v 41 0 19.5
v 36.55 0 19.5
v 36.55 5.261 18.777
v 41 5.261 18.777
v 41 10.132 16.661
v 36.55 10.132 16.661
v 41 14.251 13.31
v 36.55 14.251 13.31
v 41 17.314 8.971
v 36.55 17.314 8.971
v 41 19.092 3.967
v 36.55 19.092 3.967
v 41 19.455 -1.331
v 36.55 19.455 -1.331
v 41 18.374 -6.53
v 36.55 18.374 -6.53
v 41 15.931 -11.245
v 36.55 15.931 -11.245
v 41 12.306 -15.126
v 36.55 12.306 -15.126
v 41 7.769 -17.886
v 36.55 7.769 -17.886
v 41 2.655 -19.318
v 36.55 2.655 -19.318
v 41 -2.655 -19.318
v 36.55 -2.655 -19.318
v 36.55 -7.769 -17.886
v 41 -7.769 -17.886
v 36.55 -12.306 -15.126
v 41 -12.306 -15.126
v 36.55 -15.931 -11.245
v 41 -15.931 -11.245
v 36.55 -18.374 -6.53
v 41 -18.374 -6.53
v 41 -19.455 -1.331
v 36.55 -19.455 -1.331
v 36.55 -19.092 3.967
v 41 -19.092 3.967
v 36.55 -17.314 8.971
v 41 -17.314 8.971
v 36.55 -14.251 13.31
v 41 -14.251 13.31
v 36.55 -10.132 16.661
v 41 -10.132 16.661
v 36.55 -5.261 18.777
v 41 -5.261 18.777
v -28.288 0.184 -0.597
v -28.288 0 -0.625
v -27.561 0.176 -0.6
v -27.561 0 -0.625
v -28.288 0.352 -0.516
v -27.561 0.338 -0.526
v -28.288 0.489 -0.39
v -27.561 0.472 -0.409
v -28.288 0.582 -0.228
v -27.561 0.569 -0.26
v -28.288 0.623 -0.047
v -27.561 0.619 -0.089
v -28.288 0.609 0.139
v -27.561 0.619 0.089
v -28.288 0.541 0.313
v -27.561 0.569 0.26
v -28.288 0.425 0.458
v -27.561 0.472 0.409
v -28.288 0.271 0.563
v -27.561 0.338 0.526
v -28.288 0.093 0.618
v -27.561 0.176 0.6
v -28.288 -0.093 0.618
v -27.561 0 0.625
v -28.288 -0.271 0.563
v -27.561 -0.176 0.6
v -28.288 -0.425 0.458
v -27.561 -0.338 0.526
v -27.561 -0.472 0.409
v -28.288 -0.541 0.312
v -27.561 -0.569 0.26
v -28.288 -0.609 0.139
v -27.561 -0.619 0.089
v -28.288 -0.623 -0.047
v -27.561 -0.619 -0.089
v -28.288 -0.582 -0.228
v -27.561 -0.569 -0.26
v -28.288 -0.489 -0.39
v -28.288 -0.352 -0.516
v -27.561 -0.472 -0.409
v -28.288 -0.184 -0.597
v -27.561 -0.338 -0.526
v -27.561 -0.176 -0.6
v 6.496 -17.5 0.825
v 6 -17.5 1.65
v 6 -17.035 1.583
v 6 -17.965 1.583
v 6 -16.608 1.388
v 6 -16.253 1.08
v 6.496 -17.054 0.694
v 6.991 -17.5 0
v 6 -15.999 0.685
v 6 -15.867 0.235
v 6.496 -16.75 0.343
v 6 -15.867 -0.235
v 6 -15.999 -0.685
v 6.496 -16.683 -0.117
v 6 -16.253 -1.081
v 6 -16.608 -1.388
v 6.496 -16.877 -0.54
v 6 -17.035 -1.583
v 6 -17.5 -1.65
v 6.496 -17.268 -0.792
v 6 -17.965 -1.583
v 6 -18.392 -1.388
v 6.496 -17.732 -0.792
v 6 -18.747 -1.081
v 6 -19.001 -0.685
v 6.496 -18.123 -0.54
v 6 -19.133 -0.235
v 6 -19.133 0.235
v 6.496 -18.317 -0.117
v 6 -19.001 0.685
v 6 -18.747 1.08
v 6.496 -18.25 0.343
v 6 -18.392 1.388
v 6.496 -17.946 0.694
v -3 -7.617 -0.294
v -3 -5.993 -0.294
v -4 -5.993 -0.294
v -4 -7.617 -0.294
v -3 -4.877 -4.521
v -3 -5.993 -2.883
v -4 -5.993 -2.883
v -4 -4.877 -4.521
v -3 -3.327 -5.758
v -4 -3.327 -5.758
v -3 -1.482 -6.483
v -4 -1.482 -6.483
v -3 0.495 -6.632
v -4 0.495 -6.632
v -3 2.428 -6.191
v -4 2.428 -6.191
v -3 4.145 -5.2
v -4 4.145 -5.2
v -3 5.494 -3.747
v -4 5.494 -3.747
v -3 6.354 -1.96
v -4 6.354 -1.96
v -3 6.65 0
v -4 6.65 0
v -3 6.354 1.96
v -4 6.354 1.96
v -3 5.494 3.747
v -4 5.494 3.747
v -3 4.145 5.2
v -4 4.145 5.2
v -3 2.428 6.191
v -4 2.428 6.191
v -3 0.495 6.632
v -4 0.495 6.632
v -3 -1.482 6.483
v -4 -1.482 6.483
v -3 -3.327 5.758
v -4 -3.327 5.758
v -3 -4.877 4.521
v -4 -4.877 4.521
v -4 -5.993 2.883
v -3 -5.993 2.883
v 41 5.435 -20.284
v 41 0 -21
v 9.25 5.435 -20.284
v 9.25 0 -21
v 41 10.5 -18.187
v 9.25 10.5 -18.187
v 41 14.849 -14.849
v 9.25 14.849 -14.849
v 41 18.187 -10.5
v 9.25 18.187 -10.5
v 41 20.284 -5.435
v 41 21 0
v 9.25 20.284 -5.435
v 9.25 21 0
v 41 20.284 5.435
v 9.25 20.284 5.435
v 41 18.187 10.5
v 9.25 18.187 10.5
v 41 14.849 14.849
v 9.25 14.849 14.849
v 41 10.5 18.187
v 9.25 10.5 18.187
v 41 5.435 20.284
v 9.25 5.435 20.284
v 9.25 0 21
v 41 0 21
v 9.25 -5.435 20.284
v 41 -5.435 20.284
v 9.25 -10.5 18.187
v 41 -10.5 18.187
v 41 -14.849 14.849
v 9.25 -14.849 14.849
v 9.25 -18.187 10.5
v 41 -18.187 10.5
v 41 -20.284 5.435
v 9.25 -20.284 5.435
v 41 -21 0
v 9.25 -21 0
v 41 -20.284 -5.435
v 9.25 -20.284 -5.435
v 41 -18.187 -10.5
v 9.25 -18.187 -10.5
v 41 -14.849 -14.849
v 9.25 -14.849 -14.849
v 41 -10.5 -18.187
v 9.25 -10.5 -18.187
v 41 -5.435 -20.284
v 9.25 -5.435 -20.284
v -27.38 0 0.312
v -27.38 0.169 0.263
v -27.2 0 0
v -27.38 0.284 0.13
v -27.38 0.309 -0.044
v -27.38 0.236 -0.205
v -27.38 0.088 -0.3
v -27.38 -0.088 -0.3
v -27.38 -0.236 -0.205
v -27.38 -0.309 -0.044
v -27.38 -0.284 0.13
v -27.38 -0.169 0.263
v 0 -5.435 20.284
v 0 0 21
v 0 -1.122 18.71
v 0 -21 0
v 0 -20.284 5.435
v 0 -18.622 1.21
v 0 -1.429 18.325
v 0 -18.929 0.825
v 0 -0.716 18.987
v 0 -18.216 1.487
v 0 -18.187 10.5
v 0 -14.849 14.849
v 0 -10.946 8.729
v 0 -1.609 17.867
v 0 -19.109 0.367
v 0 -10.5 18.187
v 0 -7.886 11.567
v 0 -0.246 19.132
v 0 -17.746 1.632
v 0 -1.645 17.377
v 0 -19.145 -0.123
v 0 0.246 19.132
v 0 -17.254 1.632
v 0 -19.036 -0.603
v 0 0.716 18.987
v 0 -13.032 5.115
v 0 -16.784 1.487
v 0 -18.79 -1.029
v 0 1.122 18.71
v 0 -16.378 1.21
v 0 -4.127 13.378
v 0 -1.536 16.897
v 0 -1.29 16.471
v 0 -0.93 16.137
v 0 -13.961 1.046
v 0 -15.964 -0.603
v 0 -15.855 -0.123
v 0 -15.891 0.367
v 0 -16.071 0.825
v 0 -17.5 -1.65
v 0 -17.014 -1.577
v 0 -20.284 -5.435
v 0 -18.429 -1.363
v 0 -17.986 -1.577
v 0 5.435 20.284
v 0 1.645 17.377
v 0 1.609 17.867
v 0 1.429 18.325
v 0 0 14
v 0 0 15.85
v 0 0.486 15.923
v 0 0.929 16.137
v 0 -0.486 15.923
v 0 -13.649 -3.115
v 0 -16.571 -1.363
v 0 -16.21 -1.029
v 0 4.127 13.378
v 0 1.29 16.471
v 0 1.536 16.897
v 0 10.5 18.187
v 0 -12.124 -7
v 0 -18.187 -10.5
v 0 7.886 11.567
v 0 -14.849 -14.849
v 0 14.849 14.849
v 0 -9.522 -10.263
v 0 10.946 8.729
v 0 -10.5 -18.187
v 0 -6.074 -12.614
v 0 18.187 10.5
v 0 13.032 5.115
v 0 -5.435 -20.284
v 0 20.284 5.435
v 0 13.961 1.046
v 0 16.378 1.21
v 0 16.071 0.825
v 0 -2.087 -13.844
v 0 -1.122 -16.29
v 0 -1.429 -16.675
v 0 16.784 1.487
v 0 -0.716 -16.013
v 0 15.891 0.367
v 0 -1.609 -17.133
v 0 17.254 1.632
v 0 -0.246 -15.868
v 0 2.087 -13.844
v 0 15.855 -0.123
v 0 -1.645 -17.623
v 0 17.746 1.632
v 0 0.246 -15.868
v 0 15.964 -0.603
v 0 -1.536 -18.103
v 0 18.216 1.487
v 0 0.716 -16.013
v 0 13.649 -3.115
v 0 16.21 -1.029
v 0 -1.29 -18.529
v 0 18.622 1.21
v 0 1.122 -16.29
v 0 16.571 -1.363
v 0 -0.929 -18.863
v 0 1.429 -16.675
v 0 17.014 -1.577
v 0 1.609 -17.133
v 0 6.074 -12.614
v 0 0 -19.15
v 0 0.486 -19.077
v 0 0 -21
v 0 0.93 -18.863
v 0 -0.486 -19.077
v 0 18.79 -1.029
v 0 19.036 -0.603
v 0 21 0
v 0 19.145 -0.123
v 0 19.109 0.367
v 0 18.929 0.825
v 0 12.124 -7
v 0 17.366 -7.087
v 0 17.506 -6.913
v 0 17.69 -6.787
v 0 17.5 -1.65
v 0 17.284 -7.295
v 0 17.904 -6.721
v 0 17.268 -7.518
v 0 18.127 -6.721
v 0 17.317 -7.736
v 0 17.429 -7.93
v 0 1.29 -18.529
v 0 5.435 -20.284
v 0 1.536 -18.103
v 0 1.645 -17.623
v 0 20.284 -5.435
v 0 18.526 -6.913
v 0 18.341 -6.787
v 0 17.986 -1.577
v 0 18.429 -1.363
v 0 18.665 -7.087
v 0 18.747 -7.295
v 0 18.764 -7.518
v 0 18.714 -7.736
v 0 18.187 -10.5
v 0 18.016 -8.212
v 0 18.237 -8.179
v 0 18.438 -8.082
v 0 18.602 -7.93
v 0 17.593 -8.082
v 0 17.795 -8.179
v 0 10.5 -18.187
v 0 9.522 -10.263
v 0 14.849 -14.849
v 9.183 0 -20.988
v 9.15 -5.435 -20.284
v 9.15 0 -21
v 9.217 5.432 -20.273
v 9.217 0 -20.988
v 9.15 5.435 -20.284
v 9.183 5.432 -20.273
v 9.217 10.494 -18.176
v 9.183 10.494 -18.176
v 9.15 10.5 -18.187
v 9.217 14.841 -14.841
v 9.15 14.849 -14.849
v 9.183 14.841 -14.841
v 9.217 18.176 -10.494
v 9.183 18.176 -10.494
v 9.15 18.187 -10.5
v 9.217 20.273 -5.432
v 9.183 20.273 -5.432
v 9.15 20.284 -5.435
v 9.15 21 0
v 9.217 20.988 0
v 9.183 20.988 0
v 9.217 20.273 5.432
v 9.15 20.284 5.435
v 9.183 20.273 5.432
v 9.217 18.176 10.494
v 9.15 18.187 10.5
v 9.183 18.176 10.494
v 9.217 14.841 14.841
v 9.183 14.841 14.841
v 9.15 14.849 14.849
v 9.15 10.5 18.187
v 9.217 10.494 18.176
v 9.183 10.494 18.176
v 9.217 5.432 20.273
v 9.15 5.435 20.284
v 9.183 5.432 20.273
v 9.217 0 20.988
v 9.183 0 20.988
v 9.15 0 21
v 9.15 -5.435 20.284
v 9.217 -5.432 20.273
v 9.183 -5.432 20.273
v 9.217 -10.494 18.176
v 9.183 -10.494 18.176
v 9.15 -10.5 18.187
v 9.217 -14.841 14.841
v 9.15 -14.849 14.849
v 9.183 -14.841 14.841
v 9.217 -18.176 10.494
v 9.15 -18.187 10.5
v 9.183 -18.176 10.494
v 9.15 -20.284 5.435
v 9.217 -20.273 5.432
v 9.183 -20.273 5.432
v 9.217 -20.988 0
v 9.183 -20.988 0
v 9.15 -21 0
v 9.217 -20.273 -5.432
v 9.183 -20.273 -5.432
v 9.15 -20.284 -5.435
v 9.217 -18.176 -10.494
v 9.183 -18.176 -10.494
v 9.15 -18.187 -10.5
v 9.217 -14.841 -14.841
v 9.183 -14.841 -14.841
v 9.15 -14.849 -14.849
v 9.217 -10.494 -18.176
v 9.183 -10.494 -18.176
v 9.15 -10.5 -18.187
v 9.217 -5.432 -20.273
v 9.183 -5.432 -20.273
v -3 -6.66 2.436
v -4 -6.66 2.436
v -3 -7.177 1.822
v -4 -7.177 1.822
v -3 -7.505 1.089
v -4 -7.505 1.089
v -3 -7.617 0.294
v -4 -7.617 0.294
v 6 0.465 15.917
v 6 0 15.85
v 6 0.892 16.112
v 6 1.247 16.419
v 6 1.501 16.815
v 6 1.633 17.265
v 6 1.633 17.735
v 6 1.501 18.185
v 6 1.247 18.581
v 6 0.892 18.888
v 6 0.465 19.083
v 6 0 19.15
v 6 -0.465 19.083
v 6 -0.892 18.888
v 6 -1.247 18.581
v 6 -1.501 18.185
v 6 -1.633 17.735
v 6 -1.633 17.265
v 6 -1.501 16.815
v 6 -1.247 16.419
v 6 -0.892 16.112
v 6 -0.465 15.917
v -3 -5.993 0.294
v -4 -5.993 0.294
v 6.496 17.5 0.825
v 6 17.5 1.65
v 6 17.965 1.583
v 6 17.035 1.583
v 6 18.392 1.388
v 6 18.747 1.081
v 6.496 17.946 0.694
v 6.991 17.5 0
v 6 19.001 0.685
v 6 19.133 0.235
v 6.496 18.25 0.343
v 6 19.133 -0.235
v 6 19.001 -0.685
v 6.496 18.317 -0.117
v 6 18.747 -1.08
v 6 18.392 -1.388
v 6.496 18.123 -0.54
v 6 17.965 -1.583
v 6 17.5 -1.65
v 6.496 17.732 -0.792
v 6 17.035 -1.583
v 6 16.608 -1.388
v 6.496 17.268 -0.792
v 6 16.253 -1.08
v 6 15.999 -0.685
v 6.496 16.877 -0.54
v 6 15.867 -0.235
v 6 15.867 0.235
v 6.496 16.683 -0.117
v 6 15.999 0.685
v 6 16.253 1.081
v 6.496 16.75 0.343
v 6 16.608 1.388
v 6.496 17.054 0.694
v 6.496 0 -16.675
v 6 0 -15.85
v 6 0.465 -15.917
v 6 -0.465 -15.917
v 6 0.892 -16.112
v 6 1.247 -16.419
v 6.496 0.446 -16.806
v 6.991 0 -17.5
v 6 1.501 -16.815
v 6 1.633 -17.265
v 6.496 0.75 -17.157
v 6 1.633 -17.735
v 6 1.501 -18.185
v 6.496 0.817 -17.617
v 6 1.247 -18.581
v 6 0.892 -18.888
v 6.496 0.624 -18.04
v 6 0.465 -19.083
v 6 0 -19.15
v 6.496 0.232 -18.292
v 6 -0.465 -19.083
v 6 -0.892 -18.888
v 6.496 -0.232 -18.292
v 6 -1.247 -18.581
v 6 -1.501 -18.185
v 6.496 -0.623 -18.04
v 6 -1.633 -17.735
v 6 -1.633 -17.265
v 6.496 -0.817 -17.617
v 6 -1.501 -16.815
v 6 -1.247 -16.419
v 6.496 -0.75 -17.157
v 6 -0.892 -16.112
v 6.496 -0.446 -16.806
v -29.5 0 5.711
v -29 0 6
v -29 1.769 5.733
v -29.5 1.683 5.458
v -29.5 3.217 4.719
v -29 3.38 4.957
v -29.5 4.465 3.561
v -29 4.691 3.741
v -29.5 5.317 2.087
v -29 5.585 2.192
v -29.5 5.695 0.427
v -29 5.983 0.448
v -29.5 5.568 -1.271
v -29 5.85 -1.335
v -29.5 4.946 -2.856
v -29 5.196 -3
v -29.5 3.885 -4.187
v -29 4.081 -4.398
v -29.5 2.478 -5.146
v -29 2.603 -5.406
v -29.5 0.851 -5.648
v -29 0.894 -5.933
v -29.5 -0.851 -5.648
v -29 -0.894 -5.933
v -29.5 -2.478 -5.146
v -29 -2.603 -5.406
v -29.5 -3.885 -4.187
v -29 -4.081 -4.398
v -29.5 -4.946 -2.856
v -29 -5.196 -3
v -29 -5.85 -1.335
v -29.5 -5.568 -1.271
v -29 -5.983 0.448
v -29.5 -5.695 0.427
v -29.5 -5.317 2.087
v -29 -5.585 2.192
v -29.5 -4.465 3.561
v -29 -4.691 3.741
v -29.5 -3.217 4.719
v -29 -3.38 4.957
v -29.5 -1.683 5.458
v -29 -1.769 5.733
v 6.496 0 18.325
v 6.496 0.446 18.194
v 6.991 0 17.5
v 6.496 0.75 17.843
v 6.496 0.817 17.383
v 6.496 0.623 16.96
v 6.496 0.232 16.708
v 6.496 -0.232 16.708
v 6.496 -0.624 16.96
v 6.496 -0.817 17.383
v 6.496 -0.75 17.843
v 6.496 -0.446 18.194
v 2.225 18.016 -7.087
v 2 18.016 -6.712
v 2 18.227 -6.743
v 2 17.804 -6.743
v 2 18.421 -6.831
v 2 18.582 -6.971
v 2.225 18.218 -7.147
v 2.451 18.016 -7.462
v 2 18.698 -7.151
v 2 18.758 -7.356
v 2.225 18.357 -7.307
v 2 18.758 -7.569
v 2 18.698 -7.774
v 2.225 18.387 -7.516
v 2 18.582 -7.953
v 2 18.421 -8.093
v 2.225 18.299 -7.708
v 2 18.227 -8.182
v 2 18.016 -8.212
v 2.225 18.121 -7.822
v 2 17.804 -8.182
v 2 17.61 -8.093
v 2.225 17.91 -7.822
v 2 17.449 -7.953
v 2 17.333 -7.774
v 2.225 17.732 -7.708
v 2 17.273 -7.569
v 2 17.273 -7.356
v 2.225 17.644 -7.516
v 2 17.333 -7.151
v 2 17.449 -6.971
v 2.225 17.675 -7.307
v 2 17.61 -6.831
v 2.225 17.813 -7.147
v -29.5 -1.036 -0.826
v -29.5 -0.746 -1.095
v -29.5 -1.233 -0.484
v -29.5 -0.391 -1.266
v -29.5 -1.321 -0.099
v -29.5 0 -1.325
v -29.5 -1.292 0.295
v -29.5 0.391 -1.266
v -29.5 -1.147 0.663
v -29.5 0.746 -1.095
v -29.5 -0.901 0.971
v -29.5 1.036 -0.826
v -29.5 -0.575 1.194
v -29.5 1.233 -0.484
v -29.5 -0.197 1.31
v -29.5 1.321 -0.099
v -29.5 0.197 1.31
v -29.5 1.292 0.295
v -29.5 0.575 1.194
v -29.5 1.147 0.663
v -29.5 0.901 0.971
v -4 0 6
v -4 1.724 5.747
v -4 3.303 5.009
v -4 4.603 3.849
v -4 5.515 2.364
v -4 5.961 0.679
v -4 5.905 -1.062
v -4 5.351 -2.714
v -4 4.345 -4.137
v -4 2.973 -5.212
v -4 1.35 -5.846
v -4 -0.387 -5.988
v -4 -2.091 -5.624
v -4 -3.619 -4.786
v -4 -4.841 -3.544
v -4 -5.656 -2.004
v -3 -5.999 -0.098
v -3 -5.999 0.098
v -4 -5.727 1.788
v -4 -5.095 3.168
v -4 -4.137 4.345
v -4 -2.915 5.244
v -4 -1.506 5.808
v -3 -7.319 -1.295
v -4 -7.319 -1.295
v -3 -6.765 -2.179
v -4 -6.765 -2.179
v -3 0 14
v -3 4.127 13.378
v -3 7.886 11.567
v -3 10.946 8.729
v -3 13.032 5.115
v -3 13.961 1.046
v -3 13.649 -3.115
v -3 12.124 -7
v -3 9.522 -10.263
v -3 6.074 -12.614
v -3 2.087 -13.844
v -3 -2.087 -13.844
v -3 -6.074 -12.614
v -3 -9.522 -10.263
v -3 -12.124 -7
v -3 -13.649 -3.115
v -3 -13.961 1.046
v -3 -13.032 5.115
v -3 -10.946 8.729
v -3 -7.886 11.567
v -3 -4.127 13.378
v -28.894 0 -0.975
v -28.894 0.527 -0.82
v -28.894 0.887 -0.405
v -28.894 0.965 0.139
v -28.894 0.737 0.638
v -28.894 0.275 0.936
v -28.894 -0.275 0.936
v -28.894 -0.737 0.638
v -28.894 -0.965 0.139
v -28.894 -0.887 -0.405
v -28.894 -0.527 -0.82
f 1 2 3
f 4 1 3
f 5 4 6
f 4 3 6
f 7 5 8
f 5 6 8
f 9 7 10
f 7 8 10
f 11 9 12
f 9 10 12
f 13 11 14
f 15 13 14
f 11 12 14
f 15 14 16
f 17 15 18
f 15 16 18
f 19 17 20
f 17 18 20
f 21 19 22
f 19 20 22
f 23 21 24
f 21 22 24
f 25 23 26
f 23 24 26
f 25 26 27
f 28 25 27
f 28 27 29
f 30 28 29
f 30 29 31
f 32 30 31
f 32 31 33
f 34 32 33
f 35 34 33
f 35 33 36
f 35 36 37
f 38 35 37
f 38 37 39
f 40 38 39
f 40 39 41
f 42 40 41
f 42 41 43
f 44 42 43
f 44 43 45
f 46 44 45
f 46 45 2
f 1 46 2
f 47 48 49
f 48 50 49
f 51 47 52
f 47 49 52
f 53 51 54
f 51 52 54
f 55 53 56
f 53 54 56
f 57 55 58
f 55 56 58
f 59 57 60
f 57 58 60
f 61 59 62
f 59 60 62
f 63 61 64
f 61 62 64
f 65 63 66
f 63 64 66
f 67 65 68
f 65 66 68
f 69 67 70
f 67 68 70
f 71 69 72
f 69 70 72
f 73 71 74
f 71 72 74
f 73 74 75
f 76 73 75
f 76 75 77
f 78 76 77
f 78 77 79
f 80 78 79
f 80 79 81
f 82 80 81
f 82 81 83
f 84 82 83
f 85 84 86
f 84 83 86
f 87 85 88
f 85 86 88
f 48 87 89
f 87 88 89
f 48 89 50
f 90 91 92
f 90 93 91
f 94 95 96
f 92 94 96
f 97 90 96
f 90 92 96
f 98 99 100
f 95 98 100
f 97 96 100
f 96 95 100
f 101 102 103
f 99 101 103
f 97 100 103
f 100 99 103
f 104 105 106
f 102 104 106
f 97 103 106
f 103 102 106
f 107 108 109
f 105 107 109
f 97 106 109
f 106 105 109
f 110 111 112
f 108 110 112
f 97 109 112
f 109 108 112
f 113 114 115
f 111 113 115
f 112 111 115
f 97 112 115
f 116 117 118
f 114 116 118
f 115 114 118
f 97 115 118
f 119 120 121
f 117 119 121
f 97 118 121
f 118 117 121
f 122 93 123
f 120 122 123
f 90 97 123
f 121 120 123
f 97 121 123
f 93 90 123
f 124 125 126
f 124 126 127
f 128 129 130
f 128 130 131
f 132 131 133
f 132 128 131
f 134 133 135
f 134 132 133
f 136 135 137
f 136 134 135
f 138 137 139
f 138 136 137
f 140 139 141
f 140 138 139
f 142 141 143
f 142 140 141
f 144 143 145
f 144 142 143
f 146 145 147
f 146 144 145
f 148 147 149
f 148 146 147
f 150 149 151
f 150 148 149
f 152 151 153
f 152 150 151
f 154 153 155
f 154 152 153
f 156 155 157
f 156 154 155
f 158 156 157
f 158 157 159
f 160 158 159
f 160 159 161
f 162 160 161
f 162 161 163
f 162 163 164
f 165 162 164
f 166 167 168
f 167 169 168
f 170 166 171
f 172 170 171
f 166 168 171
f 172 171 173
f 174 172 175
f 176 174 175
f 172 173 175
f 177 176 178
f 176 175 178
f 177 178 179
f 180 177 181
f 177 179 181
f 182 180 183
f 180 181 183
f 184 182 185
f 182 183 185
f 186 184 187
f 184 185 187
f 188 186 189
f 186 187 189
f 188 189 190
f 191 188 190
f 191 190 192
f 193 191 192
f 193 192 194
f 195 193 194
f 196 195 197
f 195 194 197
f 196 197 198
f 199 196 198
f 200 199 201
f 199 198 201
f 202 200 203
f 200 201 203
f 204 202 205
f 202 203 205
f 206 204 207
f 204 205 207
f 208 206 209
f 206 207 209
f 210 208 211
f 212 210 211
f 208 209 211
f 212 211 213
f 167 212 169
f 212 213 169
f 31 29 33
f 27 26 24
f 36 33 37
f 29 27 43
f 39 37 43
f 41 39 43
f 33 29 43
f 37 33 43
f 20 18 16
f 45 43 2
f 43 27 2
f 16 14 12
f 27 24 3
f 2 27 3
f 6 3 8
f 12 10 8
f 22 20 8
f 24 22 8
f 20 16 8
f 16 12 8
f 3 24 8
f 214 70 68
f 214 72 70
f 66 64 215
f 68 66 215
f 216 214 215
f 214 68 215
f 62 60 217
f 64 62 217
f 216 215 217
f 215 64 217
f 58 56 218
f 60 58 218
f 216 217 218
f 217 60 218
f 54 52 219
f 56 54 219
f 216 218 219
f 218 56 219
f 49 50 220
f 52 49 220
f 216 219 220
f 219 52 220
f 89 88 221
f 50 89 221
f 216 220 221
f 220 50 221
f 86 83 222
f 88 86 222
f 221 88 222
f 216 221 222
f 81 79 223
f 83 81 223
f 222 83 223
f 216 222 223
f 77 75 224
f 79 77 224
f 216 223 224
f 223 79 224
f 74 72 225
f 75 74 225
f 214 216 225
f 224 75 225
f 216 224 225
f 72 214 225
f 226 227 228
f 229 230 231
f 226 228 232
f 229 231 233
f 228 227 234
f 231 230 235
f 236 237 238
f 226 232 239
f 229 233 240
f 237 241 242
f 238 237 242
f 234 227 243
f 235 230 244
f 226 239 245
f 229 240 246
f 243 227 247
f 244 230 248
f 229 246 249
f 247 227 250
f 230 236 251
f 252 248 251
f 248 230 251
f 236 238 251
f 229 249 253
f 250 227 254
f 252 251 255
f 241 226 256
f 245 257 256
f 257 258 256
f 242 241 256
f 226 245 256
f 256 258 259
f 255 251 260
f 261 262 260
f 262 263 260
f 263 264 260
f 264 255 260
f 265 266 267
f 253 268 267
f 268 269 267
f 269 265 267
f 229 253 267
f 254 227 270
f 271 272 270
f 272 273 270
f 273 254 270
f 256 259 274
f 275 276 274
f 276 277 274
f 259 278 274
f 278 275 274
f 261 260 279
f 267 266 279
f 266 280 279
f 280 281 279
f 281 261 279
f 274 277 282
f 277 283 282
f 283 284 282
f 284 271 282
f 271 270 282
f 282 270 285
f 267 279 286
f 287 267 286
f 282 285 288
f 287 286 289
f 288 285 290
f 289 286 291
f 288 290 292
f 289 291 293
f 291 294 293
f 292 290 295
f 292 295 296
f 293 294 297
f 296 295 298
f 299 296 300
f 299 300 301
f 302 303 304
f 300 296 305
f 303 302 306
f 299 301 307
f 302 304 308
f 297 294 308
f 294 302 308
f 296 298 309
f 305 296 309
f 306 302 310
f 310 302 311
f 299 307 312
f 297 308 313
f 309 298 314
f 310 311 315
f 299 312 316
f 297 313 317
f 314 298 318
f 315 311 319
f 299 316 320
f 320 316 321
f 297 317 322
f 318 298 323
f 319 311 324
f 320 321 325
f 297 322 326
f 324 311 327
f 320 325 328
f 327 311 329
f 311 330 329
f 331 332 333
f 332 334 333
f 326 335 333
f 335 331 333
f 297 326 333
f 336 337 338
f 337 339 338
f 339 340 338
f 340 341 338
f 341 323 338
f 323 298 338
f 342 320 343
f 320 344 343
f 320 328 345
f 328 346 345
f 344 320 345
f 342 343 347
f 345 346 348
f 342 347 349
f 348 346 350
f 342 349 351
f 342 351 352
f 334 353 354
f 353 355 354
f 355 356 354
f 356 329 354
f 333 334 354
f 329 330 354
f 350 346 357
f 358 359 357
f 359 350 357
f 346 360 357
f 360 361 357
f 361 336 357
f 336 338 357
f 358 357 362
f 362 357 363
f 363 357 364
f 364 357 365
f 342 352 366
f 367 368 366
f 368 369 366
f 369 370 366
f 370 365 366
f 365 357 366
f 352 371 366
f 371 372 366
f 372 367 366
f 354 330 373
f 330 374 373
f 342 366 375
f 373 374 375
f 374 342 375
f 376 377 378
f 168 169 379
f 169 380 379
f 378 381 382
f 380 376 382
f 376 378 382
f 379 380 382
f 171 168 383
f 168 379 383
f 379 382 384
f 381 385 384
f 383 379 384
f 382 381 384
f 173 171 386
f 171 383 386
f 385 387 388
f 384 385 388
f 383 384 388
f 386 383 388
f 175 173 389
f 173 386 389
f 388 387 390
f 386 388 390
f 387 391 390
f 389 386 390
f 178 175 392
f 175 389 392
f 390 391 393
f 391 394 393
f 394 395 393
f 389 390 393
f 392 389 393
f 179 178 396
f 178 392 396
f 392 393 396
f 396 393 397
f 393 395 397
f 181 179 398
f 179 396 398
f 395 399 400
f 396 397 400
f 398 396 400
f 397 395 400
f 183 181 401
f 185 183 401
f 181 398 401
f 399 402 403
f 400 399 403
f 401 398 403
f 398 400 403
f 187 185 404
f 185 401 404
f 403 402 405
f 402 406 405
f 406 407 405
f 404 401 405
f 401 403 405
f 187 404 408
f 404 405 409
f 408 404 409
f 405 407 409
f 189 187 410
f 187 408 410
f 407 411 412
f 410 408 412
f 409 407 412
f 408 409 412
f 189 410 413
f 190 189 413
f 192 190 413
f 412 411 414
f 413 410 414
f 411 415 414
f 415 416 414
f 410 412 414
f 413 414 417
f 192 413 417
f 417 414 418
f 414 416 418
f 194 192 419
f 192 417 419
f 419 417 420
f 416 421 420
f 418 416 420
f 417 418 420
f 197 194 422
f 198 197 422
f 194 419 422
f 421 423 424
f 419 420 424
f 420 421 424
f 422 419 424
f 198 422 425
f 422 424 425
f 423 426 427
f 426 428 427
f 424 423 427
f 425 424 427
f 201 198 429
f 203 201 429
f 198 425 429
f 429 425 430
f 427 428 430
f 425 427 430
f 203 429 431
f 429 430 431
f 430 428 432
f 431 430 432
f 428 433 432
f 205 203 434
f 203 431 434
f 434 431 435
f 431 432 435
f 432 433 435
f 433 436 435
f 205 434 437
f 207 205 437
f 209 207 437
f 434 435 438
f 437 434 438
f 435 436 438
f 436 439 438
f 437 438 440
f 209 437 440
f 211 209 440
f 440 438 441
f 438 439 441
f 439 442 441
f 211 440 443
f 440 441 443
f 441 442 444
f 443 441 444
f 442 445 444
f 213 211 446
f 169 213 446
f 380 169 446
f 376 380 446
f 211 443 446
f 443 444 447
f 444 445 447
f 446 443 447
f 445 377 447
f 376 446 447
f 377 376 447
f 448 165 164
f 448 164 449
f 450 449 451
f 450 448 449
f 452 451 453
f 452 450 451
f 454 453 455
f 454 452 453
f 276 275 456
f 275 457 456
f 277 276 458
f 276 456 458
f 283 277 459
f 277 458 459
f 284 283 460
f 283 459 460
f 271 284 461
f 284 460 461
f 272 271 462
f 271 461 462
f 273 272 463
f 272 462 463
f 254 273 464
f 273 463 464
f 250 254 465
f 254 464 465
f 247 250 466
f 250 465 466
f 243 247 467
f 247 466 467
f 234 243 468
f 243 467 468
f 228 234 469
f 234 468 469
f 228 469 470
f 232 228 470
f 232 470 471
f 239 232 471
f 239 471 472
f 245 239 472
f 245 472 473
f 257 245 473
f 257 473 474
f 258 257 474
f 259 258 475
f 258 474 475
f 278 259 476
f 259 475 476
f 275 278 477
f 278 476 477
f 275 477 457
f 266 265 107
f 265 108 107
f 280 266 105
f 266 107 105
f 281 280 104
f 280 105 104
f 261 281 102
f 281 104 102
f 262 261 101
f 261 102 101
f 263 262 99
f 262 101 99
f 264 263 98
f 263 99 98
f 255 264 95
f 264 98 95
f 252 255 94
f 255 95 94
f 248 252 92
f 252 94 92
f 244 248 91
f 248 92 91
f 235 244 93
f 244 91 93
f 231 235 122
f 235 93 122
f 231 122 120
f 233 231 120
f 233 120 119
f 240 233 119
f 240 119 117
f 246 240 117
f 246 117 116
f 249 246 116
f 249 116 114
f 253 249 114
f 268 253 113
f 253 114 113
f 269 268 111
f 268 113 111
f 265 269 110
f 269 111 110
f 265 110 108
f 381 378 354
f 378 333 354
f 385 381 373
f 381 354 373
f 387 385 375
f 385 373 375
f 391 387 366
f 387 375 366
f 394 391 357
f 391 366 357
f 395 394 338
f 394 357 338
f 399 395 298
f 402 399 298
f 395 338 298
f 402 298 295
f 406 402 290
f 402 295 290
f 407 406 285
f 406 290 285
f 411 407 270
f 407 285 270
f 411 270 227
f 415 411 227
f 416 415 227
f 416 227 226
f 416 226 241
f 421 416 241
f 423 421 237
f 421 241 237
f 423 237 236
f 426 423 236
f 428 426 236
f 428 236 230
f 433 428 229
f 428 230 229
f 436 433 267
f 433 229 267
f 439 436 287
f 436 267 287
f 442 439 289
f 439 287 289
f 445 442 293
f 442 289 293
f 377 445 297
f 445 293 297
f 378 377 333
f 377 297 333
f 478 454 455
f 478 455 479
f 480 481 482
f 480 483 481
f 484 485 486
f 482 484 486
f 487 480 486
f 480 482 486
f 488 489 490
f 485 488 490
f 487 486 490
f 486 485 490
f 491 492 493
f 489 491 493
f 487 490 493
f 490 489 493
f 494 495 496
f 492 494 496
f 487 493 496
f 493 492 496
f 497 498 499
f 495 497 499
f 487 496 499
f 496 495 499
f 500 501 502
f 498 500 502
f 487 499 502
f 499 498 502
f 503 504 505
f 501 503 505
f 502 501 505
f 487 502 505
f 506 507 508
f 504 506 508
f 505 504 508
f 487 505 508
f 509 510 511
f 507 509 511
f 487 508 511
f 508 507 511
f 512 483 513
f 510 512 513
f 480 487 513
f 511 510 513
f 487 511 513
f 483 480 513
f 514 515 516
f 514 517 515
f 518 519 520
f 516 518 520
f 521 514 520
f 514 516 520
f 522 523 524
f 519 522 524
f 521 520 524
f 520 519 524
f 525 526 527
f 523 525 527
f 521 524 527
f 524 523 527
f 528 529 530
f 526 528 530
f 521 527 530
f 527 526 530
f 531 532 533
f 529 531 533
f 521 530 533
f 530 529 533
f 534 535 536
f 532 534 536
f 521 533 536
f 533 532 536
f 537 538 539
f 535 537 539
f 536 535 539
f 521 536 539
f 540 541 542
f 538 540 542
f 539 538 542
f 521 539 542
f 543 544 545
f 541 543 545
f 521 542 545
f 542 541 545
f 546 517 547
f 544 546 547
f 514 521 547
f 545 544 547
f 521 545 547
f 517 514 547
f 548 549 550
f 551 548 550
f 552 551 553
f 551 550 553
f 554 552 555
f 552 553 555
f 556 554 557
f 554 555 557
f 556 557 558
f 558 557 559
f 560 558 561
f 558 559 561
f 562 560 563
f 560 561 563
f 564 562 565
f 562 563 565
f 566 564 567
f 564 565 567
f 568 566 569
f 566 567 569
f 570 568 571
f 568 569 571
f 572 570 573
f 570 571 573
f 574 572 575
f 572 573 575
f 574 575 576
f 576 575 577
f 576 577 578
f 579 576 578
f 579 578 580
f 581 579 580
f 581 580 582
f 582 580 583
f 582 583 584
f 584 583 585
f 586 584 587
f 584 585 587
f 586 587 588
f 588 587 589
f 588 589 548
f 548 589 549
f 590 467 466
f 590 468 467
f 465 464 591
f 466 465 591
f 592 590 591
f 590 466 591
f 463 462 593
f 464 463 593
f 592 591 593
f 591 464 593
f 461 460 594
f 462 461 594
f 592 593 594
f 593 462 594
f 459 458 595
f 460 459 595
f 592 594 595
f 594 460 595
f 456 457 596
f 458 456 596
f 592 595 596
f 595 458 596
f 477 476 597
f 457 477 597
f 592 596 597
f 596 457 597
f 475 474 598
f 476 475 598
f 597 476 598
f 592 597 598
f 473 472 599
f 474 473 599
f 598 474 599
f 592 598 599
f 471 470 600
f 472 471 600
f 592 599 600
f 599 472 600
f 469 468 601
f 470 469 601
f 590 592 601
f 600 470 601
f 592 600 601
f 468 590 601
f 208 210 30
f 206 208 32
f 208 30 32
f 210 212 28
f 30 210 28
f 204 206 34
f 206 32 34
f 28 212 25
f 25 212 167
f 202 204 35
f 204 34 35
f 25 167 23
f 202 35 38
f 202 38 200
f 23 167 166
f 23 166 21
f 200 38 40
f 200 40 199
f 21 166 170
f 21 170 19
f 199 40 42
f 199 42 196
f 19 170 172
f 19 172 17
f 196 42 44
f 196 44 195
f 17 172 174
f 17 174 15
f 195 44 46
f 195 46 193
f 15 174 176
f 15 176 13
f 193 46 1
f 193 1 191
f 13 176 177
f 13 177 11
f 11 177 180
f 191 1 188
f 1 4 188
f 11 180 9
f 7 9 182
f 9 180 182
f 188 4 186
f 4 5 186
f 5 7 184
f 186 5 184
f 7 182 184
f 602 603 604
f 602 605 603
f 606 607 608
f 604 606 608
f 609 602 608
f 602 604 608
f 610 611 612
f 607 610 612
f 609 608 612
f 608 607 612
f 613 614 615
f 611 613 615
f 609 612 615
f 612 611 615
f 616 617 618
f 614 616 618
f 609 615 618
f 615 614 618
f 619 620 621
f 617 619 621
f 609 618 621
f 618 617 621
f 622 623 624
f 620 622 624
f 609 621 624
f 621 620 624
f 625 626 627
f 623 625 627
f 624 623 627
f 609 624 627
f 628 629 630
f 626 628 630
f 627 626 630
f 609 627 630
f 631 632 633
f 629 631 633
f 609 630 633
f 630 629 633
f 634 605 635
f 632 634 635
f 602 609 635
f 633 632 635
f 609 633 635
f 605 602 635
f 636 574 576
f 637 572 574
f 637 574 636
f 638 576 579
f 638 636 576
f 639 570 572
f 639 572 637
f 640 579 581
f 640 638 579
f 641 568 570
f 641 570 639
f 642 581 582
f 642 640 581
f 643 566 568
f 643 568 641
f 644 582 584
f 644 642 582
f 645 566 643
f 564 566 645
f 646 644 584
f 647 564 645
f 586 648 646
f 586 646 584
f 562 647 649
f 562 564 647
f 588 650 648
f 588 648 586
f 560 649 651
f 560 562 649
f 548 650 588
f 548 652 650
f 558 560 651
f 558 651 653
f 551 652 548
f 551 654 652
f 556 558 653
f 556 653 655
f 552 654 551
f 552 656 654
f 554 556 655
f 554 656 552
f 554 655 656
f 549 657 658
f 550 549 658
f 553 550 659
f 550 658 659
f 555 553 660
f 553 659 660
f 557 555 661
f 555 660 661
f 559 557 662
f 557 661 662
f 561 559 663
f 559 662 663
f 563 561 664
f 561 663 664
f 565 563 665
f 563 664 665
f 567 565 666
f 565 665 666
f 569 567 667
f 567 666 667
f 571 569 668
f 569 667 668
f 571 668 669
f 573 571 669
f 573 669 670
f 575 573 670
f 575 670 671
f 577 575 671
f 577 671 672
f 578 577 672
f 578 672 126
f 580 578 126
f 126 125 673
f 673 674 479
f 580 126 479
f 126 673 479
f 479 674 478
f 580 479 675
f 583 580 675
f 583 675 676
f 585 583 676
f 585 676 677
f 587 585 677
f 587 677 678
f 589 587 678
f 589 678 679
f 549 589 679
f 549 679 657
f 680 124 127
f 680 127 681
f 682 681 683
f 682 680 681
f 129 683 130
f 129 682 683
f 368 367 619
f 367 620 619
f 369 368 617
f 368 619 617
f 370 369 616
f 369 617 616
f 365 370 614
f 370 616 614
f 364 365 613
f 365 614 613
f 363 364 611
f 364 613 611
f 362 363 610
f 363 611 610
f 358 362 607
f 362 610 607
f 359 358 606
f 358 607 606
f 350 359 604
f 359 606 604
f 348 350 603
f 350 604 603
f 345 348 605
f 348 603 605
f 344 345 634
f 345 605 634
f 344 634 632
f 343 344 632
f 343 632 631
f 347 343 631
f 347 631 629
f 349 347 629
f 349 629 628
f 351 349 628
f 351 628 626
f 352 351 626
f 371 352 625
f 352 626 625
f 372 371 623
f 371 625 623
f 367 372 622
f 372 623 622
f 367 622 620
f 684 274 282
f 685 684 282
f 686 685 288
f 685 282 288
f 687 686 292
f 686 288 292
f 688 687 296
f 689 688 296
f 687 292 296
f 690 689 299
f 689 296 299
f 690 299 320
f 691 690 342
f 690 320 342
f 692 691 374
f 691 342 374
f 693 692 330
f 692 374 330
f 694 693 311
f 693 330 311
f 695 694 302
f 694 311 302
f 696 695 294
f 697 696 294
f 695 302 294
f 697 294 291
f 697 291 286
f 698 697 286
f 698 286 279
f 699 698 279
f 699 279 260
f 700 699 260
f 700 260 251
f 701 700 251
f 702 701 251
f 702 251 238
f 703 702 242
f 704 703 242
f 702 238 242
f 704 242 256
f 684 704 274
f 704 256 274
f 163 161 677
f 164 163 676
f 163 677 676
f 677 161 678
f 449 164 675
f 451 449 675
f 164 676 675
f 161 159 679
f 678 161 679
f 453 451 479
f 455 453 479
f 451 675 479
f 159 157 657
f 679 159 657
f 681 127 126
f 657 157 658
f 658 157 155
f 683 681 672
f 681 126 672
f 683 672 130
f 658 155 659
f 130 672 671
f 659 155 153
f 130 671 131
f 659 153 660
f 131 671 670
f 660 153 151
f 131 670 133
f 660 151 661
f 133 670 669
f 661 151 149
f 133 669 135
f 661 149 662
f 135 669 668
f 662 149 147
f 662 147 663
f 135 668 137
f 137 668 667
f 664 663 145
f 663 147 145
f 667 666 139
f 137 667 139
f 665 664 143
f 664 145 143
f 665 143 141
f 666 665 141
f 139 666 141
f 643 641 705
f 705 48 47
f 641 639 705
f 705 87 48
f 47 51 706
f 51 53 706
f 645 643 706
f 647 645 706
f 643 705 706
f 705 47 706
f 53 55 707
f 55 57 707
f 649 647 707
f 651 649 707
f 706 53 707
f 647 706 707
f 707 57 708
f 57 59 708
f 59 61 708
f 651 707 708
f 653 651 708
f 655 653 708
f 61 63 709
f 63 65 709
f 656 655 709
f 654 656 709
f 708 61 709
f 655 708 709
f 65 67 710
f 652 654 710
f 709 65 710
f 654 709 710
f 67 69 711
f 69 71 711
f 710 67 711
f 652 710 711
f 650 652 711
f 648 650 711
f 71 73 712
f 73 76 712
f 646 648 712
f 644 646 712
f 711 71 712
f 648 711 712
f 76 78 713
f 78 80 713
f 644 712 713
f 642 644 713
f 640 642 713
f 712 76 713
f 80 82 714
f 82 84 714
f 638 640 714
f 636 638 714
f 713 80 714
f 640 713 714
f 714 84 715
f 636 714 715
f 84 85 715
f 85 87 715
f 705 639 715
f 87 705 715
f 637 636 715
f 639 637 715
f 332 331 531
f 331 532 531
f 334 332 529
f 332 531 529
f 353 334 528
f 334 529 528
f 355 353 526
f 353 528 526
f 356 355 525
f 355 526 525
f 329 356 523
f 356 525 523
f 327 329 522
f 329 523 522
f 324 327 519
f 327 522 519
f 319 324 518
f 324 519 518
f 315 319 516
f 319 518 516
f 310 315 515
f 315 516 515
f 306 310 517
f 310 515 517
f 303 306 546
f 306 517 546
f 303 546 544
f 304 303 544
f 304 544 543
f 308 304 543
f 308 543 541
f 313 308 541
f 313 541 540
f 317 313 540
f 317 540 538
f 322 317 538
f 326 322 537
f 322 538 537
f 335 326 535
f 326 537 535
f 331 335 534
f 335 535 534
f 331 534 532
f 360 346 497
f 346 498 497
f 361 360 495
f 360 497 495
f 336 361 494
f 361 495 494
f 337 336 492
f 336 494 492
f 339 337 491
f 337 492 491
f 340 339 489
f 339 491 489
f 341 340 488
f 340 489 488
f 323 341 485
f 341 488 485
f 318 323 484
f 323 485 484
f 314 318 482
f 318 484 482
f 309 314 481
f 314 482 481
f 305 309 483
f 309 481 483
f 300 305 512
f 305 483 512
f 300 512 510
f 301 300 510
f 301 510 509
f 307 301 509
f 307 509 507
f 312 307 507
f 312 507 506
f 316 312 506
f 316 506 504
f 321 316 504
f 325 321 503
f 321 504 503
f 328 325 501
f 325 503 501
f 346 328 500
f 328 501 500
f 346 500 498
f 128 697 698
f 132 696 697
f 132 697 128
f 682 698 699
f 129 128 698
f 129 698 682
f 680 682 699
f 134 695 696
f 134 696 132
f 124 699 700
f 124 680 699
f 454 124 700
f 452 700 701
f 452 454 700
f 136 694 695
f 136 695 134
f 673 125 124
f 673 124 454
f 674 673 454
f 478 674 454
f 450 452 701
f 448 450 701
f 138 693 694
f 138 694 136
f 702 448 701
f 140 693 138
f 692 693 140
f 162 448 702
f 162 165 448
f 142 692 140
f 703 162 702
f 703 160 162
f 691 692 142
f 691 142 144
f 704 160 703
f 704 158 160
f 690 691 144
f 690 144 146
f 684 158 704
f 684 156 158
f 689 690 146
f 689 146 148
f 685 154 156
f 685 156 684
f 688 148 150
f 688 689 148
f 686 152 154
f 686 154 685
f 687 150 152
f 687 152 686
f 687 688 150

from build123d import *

# Parameters (mm, degrees)
SKETCH2_R                              = 14
BOSS_EXTRUDE1_DEPTH                    = 3
SKETCH3_R                              = 6
BOSS_EXTRUDE2_DEPTH                    = 26.5
BOSS_EXTRUDE3_DEPTH                    = 1
M36_CLEARANCE_HOLE1_D                  = 39
M36_CLEARANCE_HOLE1_DEPTH              = 4.45
F_1_5_1_5_DIAMETER_HOLE1_D             = 1.5
F_1_5_1_5_DIAMETER_HOLE1_DEPTH         = 2
F_1_5_1_5_DIAMETER_HOLE1_TIP           = 0.450645464
F_3_3_3_3_DIAMETER_HOLE1_D             = 3.3
F_3_3_3_3_DIAMETER_HOLE1_DEPTH         = 6
F_3_3_3_3_DIAMETER_HOLE1_TIP           = 0.991420021
F_1_25_1_25_DIAMETER_HOLE1_D           = 1.25
F_1_25_1_25_DIAMETER_HOLE1_DEPTH       = 1.939156082
F_1_25_1_25_DIAMETER_HOLE1_CSINK_D     = 2.65
F_1_25_1_25_DIAMETER_HOLE1_CSINK_ANGLE = 60
F_1_25_1_25_DIAMETER_HOLE1_TIP         = 0.360843918
CHAMFER1_SIZE                          = 0.288675135
CHAMFER1_SIZE2                         = 0.5


with BuildPart() as part:
    # Sketch1 → Revolve1 (revolve)
    with BuildSketch(Plane.XY, mode=Mode.PRIVATE) as revolve1_sk:
        with BuildLine():
            Line((0, 21), (0, 0))
            Line((0, 0), (41, 0))
            Line((41, 0), (41, 21))
            Line((41, 21), (9.25, 21))
            ThreePointArc((9.25, 21), (9.2, 20.98660254), (9.15, 21))
            Line((9.15, 21), (0, 21))
        make_face()
    revolve(revolve1_sk.sketch.rotate(Axis((0, 0, 0), (1, 0, 0)), 270), axis=Axis((0, 0, 0), (1, 0, 0)))

    # Sketch2 → Boss-Extrude1 (add)
    with BuildSketch(Plane.ZY):
        Circle(SKETCH2_R)
    extrude(amount=BOSS_EXTRUDE1_DEPTH)

    # Sketch3 → Boss-Extrude2 (add)
    with BuildSketch(Plane.ZY.offset(3)):
        Circle(SKETCH3_R)
    extrude(amount=BOSS_EXTRUDE2_DEPTH)

    # Sketch4 → Boss-Extrude3 (add)
    with BuildSketch(Plane.ZY.offset(3)):
        with BuildLine():
            Line((0.293916284, -7.616838781), (0.293916284, -5.992796778))
            ThreePointArc((0.293916284, -5.992796778), (0, 6), (-0.293916284, -5.992796778))
            Line((-0.293916284, -5.992796778), (-0.293916284, -7.616838781))
            ThreePointArc((-0.293916284, -7.616838781), (-1.755912185, -7.072113956), (-2.882513969, -5.992796778))
            ThreePointArc((-2.882513969, -5.992796778), (0, 6.65), (2.882513969, -5.992796778))
            ThreePointArc((2.882513969, -5.992796778), (1.821852016, -7.17721696), (0.293916284, -7.616838781))
        make_face()
    extrude(amount=BOSS_EXTRUDE3_DEPTH)

    # M36 Clearance Hole1
    with Locations(Plane(origin=(41, 0, 0), x_dir=(0, 0, -1), z_dir=(1, 0, 0))):
        with Locations((0, 0)):
            Hole(M36_CLEARANCE_HOLE1_D / 2, depth=M36_CLEARANCE_HOLE1_DEPTH)

    # Ø1.5 (1.5) Diameter Hole1
    with Locations(Plane.ZY):
        with Locations((-7.462326931, 18.015650884)):
            Hole(F_1_5_1_5_DIAMETER_HOLE1_D / 2, depth=F_1_5_1_5_DIAMETER_HOLE1_DEPTH)
            with Locations((0, 0, -(F_1_5_1_5_DIAMETER_HOLE1_DEPTH + F_1_5_1_5_DIAMETER_HOLE1_TIP / 2))):  # 118° drill point
                Cone(0, F_1_5_1_5_DIAMETER_HOLE1_D / 2, F_1_5_1_5_DIAMETER_HOLE1_TIP, mode=Mode.SUBTRACT)

    # Ø3.3 (3.3) Diameter Hole1
    with Locations(Plane.ZY):
        with Locations((3.0543e-05, 17.5), (17.5, -3.0543e-05), (-3.0543e-05, -17.5), (-17.5, 3.0543e-05)):
            Hole(F_3_3_3_3_DIAMETER_HOLE1_D / 2, depth=F_3_3_3_3_DIAMETER_HOLE1_DEPTH)
            with Locations((0, 0, -(F_3_3_3_3_DIAMETER_HOLE1_DEPTH + F_3_3_3_3_DIAMETER_HOLE1_TIP / 2))):  # 118° drill point
                Cone(0, F_3_3_3_3_DIAMETER_HOLE1_D / 2, F_3_3_3_3_DIAMETER_HOLE1_TIP, mode=Mode.SUBTRACT)

    # Ø1.25 (1.25) Diameter Hole1
    with Locations(Plane.ZY.offset(29.5)):
        with Locations((0, 0)):
            CounterSinkHole(F_1_25_1_25_DIAMETER_HOLE1_D / 2, F_1_25_1_25_DIAMETER_HOLE1_CSINK_D / 2, depth=F_1_25_1_25_DIAMETER_HOLE1_DEPTH, counter_sink_angle=F_1_25_1_25_DIAMETER_HOLE1_CSINK_ANGLE)
            with Locations((0, 0, -(F_1_25_1_25_DIAMETER_HOLE1_DEPTH + F_1_25_1_25_DIAMETER_HOLE1_TIP / 2))):  # 120° drill point
                Cone(0, F_1_25_1_25_DIAMETER_HOLE1_D / 2, F_1_25_1_25_DIAMETER_HOLE1_TIP, mode=Mode.SUBTRACT)

    # Chamfer1
    chamfer1_edges = [part.edges().sort_by_distance(p)[0] for p in [
        (-29.5, 0, -6),
    ]]
    chamfer1_side = [part.faces().sort_by_distance(p)[0] for p in [
        (-29.5, 0, -5.830294373),
    ]]
    chamfer(chamfer1_edges, length=CHAMFER1_SIZE, length2=CHAMFER1_SIZE2, reference=chamfer1_side[0])


solid = part.part
